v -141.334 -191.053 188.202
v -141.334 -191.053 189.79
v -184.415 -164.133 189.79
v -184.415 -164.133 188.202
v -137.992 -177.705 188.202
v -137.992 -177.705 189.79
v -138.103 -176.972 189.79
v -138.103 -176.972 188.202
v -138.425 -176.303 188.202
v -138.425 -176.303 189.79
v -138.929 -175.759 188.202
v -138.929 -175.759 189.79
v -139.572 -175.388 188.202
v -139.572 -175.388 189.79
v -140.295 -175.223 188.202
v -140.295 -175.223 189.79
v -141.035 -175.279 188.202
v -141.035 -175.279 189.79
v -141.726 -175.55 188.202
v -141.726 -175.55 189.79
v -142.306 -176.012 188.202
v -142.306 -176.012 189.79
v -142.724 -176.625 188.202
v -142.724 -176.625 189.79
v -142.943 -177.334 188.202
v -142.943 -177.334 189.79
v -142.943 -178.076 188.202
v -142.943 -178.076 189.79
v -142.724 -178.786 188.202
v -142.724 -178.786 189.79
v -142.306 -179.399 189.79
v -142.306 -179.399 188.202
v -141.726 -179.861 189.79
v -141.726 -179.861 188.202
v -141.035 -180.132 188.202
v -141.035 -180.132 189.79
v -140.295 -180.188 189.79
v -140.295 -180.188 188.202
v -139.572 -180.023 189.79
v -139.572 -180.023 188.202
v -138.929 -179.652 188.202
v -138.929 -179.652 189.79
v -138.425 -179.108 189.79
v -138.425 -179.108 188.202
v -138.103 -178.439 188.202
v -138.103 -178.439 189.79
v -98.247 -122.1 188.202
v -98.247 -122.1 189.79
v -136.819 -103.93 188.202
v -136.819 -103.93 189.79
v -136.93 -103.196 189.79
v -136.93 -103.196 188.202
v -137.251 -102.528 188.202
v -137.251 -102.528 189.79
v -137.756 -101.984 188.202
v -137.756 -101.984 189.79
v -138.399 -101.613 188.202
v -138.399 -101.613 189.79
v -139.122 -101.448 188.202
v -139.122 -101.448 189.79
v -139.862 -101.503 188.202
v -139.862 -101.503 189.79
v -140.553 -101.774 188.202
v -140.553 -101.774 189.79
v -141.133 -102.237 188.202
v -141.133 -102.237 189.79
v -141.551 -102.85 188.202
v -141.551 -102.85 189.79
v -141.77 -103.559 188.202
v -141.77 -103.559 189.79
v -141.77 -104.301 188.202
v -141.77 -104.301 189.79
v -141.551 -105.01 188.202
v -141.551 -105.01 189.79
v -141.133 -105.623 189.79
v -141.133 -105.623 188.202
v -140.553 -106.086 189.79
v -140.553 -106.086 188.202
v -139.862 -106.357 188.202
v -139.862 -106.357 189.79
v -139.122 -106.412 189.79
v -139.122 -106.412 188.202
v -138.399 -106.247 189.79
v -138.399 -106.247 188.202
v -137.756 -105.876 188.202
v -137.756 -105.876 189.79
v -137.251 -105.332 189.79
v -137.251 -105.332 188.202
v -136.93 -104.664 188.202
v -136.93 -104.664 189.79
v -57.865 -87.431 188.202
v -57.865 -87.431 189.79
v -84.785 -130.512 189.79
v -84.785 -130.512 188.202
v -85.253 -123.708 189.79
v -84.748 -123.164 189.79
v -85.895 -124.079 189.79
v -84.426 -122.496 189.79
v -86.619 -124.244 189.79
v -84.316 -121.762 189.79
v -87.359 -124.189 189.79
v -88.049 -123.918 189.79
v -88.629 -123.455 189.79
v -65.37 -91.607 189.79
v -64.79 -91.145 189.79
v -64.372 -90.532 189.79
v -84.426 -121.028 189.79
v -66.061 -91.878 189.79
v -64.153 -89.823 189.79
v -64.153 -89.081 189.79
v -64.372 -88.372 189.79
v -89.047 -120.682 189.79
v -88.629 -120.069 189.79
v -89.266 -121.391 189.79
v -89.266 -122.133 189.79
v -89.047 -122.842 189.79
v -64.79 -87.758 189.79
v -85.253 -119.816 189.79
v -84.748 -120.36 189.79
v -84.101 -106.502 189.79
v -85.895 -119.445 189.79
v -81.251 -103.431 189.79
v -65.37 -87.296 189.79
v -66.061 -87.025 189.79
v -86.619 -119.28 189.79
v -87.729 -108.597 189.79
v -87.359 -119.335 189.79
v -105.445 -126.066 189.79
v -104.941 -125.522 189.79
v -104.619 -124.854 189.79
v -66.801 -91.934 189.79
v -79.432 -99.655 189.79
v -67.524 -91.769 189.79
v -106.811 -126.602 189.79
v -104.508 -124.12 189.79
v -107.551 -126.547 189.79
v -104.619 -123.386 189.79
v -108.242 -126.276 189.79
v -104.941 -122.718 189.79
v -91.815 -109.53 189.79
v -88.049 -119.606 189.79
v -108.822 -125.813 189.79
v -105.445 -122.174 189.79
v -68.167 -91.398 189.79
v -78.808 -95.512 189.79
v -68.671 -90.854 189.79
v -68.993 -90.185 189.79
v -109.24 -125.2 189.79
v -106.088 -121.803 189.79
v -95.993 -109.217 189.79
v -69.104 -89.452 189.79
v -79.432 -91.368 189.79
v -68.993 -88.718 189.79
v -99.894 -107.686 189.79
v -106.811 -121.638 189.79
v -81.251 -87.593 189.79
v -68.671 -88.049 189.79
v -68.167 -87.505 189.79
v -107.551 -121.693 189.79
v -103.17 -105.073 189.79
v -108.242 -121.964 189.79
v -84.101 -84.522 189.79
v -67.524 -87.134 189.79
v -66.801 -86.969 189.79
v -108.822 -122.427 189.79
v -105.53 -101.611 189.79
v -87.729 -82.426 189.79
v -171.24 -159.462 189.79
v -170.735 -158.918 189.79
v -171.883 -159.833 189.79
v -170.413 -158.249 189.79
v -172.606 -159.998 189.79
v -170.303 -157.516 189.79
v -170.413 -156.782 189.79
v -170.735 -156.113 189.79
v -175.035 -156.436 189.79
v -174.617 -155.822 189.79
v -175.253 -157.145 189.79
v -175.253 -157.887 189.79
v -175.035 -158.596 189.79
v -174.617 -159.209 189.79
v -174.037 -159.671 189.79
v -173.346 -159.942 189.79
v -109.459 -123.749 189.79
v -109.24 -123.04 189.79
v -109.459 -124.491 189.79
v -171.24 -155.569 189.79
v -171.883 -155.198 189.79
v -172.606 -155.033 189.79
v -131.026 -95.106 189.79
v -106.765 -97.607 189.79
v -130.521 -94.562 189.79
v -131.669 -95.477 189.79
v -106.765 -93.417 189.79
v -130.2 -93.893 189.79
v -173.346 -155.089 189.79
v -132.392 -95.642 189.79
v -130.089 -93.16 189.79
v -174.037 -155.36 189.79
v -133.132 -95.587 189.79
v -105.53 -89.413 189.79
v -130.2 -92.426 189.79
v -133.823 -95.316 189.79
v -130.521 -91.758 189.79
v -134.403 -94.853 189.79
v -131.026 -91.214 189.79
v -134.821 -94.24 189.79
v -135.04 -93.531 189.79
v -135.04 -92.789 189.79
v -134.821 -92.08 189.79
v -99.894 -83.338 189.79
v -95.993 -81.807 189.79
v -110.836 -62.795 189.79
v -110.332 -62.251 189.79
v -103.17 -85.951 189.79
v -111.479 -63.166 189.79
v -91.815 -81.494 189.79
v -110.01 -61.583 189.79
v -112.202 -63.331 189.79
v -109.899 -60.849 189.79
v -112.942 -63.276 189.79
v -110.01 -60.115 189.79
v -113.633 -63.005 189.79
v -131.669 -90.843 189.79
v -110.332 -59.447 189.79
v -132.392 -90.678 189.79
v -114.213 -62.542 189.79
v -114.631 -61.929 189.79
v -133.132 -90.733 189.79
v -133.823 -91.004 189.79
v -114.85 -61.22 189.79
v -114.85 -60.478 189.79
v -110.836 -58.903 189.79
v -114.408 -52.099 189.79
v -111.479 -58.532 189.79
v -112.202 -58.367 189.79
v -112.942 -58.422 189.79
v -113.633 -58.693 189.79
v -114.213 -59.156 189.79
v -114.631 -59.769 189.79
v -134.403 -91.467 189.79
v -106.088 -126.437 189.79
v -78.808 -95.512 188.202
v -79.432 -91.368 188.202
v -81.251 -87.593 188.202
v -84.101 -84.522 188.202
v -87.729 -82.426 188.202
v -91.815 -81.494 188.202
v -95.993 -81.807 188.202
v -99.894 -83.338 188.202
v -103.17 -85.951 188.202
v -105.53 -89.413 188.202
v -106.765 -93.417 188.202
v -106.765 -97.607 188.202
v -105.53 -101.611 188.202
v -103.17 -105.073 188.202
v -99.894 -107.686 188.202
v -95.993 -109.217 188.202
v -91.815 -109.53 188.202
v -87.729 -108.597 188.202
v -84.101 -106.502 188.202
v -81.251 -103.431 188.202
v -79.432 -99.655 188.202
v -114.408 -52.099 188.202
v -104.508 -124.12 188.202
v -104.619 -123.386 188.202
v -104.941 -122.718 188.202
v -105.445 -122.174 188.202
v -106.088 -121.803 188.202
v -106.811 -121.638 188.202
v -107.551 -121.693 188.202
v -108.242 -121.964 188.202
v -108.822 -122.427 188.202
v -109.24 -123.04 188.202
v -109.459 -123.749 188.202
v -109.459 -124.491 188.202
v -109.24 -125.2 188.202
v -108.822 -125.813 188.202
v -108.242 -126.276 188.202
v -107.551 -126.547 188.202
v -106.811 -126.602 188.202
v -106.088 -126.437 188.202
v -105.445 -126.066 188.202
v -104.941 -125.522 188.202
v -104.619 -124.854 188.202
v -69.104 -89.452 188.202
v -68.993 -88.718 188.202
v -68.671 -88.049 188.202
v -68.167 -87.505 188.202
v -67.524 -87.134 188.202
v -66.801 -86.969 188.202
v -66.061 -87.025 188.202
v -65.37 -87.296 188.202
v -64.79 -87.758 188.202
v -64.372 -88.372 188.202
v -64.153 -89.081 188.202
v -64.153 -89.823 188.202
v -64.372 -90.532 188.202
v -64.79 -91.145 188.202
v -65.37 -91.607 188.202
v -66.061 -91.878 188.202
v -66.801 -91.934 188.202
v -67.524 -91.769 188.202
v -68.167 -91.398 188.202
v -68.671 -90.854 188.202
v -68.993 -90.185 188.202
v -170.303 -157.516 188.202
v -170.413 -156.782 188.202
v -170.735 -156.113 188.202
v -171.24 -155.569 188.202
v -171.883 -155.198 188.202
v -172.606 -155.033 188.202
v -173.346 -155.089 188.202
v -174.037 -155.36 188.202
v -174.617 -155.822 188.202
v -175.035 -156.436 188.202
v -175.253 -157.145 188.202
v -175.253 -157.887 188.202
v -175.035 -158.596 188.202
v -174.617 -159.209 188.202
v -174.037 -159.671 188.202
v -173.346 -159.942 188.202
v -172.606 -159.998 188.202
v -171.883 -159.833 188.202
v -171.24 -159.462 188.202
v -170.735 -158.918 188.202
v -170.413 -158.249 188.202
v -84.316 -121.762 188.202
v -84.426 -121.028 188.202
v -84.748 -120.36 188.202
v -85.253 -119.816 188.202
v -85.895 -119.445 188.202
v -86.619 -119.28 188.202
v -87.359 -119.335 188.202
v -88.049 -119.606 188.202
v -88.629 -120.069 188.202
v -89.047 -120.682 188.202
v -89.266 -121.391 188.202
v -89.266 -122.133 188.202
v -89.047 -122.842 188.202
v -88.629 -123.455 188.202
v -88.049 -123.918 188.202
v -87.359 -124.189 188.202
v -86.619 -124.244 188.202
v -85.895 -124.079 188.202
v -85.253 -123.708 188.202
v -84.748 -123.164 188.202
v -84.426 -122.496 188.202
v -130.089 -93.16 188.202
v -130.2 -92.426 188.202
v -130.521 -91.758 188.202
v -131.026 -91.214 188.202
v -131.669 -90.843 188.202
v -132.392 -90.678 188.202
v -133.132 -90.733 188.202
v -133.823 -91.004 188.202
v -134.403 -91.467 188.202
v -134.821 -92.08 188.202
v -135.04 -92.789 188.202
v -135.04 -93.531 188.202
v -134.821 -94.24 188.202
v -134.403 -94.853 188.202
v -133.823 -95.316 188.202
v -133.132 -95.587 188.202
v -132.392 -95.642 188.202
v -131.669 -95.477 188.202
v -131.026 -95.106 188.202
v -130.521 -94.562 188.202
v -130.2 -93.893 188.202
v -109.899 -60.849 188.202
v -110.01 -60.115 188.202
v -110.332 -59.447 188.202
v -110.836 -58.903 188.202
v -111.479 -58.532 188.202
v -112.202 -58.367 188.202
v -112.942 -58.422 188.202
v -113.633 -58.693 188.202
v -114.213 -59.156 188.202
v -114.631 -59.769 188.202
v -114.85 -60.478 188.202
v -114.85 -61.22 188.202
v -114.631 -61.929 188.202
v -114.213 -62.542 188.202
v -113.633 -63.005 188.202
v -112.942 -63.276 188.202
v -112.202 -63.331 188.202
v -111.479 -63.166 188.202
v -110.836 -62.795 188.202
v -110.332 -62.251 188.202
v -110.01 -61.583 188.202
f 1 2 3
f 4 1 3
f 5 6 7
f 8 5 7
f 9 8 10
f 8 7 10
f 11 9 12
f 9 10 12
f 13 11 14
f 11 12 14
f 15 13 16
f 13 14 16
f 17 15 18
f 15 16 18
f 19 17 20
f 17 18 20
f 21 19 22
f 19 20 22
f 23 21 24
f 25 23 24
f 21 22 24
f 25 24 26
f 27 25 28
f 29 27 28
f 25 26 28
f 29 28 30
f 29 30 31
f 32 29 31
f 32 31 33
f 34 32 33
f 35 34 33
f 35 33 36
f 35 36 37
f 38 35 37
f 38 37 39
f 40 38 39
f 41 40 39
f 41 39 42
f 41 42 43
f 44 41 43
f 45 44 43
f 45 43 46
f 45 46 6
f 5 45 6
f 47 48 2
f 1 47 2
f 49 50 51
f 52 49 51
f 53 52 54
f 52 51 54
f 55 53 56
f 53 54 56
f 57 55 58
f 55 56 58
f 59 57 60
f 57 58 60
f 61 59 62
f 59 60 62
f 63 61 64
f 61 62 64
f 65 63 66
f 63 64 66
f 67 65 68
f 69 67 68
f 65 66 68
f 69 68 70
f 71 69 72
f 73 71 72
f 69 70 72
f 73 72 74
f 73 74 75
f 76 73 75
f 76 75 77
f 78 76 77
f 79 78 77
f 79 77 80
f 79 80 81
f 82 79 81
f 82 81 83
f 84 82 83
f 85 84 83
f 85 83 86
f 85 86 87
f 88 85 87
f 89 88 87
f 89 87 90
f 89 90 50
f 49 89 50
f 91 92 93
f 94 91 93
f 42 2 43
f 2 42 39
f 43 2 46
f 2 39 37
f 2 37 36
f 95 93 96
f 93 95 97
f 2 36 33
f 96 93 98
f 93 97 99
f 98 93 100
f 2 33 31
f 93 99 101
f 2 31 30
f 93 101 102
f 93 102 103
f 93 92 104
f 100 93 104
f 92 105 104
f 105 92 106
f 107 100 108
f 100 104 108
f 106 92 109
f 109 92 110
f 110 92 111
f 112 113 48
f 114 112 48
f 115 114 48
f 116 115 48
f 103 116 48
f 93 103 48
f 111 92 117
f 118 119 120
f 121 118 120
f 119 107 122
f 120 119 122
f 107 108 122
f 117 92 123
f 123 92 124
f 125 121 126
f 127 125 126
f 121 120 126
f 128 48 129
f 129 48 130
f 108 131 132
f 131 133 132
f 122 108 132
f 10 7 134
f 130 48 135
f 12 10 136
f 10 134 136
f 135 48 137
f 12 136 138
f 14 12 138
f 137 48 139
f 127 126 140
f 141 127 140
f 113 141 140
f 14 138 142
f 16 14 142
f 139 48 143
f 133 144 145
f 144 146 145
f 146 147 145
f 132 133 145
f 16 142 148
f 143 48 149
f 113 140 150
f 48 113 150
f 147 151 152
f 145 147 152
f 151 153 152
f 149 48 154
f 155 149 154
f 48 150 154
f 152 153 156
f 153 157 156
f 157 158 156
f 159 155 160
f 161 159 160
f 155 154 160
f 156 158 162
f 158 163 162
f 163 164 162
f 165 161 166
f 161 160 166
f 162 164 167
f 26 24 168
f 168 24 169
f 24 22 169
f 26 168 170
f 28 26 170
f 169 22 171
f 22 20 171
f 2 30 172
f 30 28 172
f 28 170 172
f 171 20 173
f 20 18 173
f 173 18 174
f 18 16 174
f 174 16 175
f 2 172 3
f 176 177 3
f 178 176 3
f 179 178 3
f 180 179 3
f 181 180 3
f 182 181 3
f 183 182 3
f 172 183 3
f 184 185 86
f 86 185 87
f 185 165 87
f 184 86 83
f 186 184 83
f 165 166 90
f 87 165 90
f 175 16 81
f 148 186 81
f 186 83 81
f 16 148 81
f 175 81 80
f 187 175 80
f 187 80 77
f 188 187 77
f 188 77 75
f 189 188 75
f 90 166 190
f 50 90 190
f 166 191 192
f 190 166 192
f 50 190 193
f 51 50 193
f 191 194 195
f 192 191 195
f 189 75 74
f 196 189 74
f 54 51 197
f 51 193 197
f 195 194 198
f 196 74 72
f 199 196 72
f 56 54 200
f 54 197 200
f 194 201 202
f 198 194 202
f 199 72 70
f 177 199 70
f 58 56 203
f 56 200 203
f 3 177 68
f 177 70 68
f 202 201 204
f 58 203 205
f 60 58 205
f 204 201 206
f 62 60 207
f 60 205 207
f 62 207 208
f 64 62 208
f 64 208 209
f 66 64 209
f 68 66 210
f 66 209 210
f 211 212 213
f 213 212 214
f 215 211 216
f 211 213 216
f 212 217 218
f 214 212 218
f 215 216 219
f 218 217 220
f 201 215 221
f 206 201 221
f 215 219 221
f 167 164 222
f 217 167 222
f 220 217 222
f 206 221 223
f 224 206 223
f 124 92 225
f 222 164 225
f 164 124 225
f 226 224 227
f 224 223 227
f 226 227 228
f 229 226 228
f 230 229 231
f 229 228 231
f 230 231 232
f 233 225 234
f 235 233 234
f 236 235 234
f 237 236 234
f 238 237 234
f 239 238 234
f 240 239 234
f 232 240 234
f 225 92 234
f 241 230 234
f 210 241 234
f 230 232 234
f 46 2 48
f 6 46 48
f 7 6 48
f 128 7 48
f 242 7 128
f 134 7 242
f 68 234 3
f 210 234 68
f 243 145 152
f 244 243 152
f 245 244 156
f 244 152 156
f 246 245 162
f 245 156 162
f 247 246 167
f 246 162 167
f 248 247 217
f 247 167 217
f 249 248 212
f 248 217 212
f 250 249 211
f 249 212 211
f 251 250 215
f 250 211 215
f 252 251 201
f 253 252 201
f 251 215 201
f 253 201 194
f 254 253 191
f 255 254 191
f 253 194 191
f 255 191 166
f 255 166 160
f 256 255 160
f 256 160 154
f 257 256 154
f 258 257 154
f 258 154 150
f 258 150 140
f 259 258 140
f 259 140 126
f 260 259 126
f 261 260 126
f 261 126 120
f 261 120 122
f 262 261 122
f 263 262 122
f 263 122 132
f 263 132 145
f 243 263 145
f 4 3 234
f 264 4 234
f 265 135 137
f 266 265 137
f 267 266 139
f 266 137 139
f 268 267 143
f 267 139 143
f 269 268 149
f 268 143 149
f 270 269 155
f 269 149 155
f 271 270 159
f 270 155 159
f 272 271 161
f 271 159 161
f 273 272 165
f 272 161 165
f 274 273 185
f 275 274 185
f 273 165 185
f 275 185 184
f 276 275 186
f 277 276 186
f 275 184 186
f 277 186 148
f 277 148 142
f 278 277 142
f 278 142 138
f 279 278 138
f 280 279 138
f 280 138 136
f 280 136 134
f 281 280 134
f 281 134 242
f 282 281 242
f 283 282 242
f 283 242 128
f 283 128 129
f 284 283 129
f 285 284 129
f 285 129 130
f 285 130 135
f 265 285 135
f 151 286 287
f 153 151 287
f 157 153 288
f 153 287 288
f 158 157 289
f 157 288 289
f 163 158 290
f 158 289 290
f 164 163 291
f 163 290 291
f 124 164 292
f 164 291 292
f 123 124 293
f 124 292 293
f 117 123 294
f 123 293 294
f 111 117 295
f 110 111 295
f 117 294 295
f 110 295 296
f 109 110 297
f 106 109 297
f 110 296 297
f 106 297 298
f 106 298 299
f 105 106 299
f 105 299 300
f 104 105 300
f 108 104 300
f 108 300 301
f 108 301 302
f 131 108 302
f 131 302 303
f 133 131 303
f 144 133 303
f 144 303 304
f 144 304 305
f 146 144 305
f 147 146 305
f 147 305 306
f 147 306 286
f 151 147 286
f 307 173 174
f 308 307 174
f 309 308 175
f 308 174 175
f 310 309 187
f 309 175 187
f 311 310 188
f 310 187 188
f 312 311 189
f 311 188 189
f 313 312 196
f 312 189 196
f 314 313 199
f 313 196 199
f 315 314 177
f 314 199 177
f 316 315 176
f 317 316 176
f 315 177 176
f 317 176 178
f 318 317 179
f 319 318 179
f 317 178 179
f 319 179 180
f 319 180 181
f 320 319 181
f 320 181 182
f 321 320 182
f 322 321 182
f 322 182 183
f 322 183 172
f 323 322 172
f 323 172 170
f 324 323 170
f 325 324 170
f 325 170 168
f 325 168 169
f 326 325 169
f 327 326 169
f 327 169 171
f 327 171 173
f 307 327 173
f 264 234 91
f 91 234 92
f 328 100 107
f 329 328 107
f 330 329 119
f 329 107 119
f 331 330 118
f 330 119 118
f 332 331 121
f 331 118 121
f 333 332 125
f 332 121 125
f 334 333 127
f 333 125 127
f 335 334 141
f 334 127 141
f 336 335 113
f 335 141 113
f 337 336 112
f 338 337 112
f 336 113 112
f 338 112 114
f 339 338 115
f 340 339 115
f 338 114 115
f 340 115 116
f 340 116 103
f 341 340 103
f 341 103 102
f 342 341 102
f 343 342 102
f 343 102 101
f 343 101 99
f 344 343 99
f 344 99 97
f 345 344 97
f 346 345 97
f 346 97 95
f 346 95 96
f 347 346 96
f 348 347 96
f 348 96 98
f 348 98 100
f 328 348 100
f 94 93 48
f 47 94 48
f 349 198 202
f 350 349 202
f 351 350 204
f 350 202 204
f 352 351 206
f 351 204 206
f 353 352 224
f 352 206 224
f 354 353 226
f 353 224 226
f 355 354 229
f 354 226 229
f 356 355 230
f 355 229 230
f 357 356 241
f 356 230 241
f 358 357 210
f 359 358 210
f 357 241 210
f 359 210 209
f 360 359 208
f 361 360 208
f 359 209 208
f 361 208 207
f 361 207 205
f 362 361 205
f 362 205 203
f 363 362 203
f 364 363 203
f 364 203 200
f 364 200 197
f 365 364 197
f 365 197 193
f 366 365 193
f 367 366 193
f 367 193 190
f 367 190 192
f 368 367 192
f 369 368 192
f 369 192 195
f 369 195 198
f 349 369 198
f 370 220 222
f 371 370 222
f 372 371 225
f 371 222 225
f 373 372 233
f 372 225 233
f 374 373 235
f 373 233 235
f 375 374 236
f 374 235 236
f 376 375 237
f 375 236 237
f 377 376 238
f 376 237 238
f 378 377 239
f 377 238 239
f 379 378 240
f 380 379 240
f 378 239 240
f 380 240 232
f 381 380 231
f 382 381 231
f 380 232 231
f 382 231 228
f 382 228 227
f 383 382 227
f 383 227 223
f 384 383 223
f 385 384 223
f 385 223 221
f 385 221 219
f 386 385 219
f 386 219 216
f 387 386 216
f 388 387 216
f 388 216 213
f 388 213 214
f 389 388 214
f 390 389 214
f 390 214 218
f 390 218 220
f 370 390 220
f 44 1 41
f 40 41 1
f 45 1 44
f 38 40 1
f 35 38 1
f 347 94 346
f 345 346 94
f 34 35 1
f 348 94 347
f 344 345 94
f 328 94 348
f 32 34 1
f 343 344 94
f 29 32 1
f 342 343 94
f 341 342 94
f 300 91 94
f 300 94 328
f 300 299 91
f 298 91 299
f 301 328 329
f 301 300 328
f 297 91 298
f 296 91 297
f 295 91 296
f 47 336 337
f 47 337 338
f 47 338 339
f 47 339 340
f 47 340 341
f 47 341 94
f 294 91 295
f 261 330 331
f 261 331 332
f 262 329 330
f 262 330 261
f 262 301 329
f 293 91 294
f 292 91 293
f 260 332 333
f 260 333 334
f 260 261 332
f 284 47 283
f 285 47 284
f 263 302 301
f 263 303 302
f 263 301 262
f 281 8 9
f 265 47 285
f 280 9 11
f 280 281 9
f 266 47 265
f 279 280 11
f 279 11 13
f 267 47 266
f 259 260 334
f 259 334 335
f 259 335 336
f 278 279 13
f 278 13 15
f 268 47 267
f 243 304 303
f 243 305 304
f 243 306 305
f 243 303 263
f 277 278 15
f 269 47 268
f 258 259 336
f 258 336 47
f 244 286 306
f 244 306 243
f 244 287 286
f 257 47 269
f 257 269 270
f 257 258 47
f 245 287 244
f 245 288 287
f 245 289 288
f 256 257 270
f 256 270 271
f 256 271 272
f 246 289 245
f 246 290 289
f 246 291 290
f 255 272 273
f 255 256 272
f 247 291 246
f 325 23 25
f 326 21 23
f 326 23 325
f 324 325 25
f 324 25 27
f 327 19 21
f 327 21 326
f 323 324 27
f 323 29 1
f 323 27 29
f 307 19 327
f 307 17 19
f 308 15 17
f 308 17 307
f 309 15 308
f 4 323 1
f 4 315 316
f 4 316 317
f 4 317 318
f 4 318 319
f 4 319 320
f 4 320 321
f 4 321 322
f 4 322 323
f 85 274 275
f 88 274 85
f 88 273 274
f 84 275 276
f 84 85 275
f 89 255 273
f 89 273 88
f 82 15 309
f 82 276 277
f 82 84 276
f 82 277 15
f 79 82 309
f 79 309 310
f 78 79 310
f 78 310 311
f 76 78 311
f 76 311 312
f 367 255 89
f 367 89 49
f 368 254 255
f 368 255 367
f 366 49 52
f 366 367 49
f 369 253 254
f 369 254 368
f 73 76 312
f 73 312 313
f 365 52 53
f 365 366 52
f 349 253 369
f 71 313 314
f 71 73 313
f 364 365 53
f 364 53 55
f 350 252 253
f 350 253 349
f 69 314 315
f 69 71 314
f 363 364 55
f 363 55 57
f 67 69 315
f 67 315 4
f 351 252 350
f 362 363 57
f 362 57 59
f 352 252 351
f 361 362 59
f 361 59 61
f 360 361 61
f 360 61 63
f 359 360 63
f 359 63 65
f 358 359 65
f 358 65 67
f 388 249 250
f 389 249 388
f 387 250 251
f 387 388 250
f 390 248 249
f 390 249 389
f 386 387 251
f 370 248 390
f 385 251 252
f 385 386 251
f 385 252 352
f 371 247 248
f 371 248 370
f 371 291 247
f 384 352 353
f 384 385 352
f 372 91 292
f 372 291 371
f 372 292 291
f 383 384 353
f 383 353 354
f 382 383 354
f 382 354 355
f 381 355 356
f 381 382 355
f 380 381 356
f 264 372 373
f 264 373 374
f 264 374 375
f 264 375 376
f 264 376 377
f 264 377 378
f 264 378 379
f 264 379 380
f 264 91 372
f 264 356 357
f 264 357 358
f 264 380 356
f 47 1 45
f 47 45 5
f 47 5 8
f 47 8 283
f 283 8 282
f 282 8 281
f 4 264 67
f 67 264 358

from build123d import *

# Parameters (mm, degrees)
BOSS_EXTRUDE1_DEPTH    = 1.5875
F_10_CLEARANCE_HOLE1_D = 4.9784
SKETCH5_R              = 14.057169334
CUT_EXTRUDE1_DEPTH     = 2.54
F_10_CLEARANCE_HOLE2_D = 4.9784


with BuildPart() as part:
    # Sketch2 → Boss-Extrude1 (new body)
    with BuildSketch(Plane(origin=(0, 0, 189.78999271), x_dir=(-1, 0, 0), z_dir=(0, 0, -1))):
        Polygon((57.864732818, -87.431436787), (84.784631441, -130.512280072), (98.247394968, -122.099811752), (141.333866252, -191.052579482), (184.414709536, -164.132680859), (114.40833963, -52.099069844), align=None)
    extrude(amount=BOSS_EXTRUDE1_DEPTH)

    # #10 Clearance Hole1 (through all)
    with Locations(Plane(origin=(0, 0, 188.20249271), x_dir=(-1, 0, 0), z_dir=(0, 0, -1))):
        with Locations((106.997487706, -124.119929835), (86.804749524, -121.762187333), (112.388221547, -60.849162582), (132.578145514, -93.159795046), (139.30812017, -103.930005867), (172.792086333, -157.515553088), (140.48145387, -177.705477055)):
            Hole(F_10_CLEARANCE_HOLE1_D / 2)

    # Sketch5 → Cut-Extrude1 (cut)
    with BuildSketch(Plane.XY.offset(189.78999271)):
        with Locations((-92.865103341, -95.511909387)):
            Circle(SKETCH5_R)
    extrude(amount=-CUT_EXTRUDE1_DEPTH, mode=Mode.SUBTRACT)

    # #10 Clearance Hole2 (through all)
    with Locations(Plane.XY.offset(189.78999271)):
        with Locations((-66.614825557, -89.451554869)):
            Hole(F_10_CLEARANCE_HOLE2_D / 2)


solid = part.part
